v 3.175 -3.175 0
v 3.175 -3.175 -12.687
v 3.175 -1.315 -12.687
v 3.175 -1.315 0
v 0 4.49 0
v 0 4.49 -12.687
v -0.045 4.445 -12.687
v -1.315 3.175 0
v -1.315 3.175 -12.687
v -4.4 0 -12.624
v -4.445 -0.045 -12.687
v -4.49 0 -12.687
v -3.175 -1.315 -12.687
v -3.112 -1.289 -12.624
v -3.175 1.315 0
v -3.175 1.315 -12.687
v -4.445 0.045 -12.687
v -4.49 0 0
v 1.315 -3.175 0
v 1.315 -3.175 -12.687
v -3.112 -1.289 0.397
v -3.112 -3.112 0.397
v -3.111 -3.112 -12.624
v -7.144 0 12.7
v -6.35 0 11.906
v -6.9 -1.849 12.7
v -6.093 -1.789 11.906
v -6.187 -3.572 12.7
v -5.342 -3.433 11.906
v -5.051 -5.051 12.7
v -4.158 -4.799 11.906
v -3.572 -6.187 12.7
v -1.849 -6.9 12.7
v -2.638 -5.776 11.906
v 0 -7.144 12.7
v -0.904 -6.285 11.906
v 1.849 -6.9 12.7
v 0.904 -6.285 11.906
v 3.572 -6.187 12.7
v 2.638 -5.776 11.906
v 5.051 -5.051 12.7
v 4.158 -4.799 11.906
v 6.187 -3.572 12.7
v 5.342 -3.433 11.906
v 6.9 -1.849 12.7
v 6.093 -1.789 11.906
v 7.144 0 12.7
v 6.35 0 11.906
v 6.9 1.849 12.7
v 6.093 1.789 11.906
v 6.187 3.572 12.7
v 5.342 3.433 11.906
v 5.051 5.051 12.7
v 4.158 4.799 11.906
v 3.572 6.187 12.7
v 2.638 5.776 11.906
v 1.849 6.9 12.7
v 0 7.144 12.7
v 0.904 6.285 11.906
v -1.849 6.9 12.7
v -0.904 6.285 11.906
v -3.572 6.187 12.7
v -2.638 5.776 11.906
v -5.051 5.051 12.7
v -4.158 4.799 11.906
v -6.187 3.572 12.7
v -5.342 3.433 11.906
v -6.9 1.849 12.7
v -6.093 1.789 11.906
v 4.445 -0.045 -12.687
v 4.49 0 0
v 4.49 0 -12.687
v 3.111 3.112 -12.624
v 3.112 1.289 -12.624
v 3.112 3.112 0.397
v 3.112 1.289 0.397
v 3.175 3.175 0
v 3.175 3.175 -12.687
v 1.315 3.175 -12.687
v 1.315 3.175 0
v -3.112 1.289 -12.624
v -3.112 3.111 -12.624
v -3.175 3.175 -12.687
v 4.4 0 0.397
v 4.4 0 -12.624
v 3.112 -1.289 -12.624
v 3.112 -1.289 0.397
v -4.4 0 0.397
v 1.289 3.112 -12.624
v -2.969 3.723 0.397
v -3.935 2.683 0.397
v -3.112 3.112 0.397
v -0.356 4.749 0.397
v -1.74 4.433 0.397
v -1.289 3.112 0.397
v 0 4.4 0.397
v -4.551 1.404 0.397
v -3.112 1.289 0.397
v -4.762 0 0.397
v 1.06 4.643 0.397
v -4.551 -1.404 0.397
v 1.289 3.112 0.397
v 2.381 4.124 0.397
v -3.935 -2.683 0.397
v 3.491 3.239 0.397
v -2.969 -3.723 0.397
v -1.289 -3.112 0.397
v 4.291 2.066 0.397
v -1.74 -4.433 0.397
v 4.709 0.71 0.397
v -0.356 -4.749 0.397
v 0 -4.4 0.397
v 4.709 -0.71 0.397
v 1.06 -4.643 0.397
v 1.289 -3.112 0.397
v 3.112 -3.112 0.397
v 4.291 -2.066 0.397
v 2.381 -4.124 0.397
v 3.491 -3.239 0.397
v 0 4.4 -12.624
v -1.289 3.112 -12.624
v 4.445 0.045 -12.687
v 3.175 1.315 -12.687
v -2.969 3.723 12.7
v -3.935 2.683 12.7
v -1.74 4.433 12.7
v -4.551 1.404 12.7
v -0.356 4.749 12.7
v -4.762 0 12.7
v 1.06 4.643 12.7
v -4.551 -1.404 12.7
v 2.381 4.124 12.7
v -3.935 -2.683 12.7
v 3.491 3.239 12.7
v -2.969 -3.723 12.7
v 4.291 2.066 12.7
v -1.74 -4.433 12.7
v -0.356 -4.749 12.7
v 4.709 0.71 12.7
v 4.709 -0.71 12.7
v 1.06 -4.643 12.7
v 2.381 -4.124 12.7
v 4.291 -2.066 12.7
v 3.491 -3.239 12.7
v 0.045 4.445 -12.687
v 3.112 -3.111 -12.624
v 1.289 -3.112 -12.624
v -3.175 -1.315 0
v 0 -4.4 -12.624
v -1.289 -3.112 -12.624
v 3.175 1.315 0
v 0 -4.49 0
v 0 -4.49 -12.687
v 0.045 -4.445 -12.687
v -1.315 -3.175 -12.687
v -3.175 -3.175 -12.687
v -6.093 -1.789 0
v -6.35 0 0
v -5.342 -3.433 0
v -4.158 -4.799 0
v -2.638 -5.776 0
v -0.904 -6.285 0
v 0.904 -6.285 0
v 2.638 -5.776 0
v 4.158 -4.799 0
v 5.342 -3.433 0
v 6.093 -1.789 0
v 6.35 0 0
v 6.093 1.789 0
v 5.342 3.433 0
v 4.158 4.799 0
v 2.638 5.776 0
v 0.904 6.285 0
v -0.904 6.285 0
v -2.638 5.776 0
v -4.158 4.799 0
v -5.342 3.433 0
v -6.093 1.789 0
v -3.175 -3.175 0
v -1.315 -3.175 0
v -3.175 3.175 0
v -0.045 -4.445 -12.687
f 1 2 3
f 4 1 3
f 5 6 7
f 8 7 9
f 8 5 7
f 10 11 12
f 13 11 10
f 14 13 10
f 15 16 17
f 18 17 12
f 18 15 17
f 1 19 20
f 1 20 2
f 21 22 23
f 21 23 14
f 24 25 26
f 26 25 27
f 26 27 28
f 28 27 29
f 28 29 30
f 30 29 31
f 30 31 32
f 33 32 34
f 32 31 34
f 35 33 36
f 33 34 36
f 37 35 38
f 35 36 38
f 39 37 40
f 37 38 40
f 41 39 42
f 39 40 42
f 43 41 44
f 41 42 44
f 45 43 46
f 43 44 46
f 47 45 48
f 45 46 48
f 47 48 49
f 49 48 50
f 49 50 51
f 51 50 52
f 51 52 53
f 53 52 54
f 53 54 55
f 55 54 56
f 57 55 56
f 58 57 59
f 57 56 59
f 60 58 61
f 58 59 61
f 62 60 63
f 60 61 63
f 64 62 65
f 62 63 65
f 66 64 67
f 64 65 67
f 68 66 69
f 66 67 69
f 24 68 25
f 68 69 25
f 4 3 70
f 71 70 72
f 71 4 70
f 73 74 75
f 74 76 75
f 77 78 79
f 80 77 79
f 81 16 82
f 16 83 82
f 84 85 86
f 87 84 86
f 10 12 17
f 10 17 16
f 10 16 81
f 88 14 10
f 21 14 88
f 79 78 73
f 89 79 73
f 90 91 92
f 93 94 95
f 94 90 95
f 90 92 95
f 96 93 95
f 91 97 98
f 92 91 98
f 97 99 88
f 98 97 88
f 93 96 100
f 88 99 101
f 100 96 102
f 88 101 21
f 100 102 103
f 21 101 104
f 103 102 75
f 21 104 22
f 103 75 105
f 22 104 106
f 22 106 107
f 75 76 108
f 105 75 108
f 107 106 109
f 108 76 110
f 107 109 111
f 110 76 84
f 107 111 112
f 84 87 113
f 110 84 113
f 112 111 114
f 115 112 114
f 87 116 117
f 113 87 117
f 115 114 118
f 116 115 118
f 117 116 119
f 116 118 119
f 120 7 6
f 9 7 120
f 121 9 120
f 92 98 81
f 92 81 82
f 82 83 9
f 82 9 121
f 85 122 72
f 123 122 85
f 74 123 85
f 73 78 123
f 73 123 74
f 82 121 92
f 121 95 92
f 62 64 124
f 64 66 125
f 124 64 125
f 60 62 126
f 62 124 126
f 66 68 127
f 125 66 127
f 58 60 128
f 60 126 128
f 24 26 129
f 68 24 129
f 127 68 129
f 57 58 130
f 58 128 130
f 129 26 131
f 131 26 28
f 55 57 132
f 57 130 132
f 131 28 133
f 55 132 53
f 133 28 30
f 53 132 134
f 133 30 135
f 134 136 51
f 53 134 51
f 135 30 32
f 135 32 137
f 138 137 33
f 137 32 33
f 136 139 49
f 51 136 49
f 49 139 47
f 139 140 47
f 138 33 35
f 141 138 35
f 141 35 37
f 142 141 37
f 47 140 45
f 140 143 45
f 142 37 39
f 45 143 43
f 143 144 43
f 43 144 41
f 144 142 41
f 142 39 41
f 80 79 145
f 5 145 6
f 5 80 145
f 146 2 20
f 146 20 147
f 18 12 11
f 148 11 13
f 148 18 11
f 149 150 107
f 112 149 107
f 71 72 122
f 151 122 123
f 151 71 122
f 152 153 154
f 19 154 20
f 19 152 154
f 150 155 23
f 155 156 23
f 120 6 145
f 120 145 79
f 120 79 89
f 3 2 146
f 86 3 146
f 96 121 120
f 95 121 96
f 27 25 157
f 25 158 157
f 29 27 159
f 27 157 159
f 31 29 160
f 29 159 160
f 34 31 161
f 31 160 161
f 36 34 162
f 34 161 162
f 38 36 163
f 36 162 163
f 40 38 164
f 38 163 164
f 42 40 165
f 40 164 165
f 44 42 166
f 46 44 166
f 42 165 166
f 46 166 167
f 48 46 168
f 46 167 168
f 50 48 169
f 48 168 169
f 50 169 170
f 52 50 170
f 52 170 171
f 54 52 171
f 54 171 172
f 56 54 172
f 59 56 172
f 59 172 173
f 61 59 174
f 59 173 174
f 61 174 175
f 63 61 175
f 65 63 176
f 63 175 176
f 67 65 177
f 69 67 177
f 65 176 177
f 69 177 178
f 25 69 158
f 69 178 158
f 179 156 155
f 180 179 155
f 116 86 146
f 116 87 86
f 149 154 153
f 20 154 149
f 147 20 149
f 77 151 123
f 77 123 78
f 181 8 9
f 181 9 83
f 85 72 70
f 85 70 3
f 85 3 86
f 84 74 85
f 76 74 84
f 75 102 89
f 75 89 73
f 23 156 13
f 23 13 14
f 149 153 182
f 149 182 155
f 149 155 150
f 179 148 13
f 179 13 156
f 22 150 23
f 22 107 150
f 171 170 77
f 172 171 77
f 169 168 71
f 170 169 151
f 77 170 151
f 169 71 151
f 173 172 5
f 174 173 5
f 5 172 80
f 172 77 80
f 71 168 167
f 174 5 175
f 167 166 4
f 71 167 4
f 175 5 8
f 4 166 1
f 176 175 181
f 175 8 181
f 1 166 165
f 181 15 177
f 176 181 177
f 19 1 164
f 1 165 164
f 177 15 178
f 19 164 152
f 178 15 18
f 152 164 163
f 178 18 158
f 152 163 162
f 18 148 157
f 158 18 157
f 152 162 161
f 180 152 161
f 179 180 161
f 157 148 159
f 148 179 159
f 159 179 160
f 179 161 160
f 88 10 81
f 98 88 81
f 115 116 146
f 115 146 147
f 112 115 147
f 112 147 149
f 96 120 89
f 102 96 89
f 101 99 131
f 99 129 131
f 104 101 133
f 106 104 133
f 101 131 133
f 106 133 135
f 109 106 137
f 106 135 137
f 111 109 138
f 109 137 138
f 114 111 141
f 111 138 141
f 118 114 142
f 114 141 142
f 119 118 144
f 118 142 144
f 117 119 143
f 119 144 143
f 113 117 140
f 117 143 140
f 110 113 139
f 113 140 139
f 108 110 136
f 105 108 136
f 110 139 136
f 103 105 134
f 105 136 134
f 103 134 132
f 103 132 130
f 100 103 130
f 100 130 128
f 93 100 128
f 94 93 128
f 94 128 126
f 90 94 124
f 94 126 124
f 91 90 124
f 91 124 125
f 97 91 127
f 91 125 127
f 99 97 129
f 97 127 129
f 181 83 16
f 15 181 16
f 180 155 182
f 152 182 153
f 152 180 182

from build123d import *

# Parameters (mm, degrees)
F1_DEPTH      = 12.7
F4_DEPTH      = 25.4
F5_T1_DEPTH   = 2.0186367444
F5_T3_DEPTH   = 2.0186367444
F5_T5_DEPTH   = 2.0186367444
F5_T7_DEPTH   = 2.0186367444
F5_T9_DEPTH   = 2.0186367444
F5_T11_DEPTH  = 2.0186367444
F5_T13_DEPTH  = 2.0186367444
F5_T15_DEPTH  = 2.0186367444
F5_T17_DEPTH  = 2.0186367444
F5_T19_DEPTH  = 2.0186367444
F5_T21_DEPTH  = 2.0186367444
F5_T23_DEPTH  = 2.0186367444
F5_T29_DEPTH  = 2.214598988
F5_T35_DEPTH  = 2.214598988
F5_T44_DEPTH  = 2.214598988
F5_T50_DEPTH  = 2.214598988
F5_T59_DEPTH  = 2.214598988
F5_T65_DEPTH  = 2.214598988
F5_T74_DEPTH  = 2.214598988
F5_T80_DEPTH  = 2.214598988
F5_T89_DEPTH  = 2.214598988
F5_T95_DEPTH  = 2.214598988
F5_T104_DEPTH = 2.214598988
F5_T110_DEPTH = 2.214598988
F5_T119_DEPTH = 2.214598988
F5_T125_DEPTH = 2.214598988
F5_T134_DEPTH = 2.214598988
F5_T140_DEPTH = 2.214598988


# Not quite as in the source:
# - a fillet or chamfer that OpenCascade refuses, or shapes differently, is made with other operations: its cross-section is extruded or revolved along the edge and cut away or added


with BuildPart() as f1:
    # F0 (on Top) → F1 (new body)
    with BuildSketch(Plane.XY):
        Polygon((1.3151280605, -3.175), (3.175, -3.175), (3.175, -1.3151280605), (4.4901280605, 0), (3.175, 1.3151280605), (3.175, 3.175), (1.3151280605, 3.175), (0, 4.4901280605), (-1.3151280605, 3.175), (-3.175, 3.175), (-3.175, 1.3151280605), (-4.4901280605, 0), (-3.175, -1.3151280605), (-3.175, -3.175), (-1.3151280605, -3.175), (0, -4.4901280605), align=None)
        Polygon((3.1115, -1.2888254993), (3.1115, -3.1115), (1.2888254993, -3.1115), (0, -4.4003254993), (-1.2888254993, -3.1115), (-3.1115, -3.1115), (-3.1115, -1.2888254993), (-4.4003254993, 0), (-3.1115, 1.2888254993), (-3.1115, 3.1115), (-1.2888254993, 3.1115), (0, 4.4003254993), (1.2888254993, 3.1115), (3.1115, 3.1115), (3.1115, 1.2888254993), (4.4003254993, 0), align=None, mode=Mode.SUBTRACT)
    extrude(amount=-F1_DEPTH)

    # F2 (on Front) → F3 (revolve)
    with BuildSketch(Plane.XZ):
        Polygon((-6.35, 0), (0, 0), (0, 0.396875), (-4.7625, 0.396875), (-4.7625, 12.7), (-6.35, 12.7), (-6.35, 11.90625), align=None)
        Polygon((-7.14375, 12.7), (-6.35, 11.90625), (-6.35, 12.7), align=None)
    revolve(axis=Axis((0, 0, 0.1984375), (0, 0, 1)))

    # F4 (cut): a face of the model
    f4_faces = [f1.faces().sort_by_distance(p)[0] for p in [
        (0, 0, 0),
    ]]
    extrude(f4_faces, amount=-F4_DEPTH, mode=Mode.SUBTRACT)

    # F5: chamfer of 0.0762 on 16 edges, made by hand

    # F5_s2 → F5_t1 (cut)
    with BuildSketch(Plane(origin=(-0.772771019, -0.772771019, 0), x_dir=(0, 0, 1), z_dir=(-0.7071067812, -0.7071067812, 0))):
        Polygon((-12.7, -3.1877), (-12.6238, -3.1115), (-12.7, -3.1115), align=None)
    extrude(amount=F5_T1_DEPTH, mode=Mode.SUBTRACT)

    # F5_s4 → F5_t3 (cut)
    with BuildSketch(Plane.YZ.offset(1.0928632556)):
        Polygon((-3.1877, -12.7), (-3.1115, -12.6238), (-3.1115, -12.7), align=None)
        Polygon((3.1877, -12.7), (3.1115, -12.6238), (3.1115, -12.7), align=None)
    extrude(amount=F5_T3_DEPTH, mode=Mode.SUBTRACT)

    # F5_s6 → F5_t5 (cut)
    with BuildSketch(Plane.XZ.offset(1.0928632556)):
        Polygon((3.1877, -12.7), (3.1115, -12.6238), (3.1115, -12.7), align=None)
        Polygon((-3.1877, -12.7), (-3.1115, -12.6238), (-3.1115, -12.7), align=None)
    extrude(amount=F5_T5_DEPTH, mode=Mode.SUBTRACT)

    # F5_s8 → F5_t7 (cut)
    with BuildSketch(Plane(origin=(2.2001627497, 2.2001627497, 0), x_dir=(0, 0, 1), z_dir=(-0.7071067812, -0.7071067812, 0))):
        Polygon((-12.7, -3.1877), (-12.6238, -3.1115), (-12.7, -3.1115), align=None)
    extrude(amount=F5_T7_DEPTH, mode=Mode.SUBTRACT)

    # F5_s10 → F5_t9 (cut)
    with BuildSketch(Plane(origin=(0.772771019, -0.772771019, 0), x_dir=(0, 0, 1), z_dir=(0.7071067812, -0.7071067812, 0))):
        Polygon((-12.7, -3.1877), (-12.6238, -3.1115), (-12.7, -3.1115), align=None)
    extrude(amount=F5_T9_DEPTH, mode=Mode.SUBTRACT)

    # F5_s12 → F5_t11 (cut)
    with BuildSketch(Plane.XZ.offset(-3.1115)):
        Polygon((3.1877, -12.7), (3.1115, -12.6238), (3.1115, -12.7), align=None)
        Polygon((-3.1877, -12.7), (-3.1115, -12.6238), (-3.1115, -12.7), align=None)
    extrude(amount=F5_T11_DEPTH, mode=Mode.SUBTRACT)

    # F5_s14 → F5_t13 (cut)
    with BuildSketch(Plane(origin=(-2.2001627497, 2.2001627497, 0), x_dir=(0, 0, 1), z_dir=(0.7071067812, -0.7071067812, 0))):
        Polygon((-12.7, -3.1877), (-12.6238, -3.1115), (-12.7, -3.1115), align=None)
    extrude(amount=F5_T13_DEPTH, mode=Mode.SUBTRACT)

    # F5_s16 → F5_t15 (cut)
    with BuildSketch(Plane(origin=(0.772771019, 0.772771019, 0), x_dir=(0, 0, 1), z_dir=(0.7071067812, 0.7071067812, 0))):
        Polygon((-12.7, -3.1877), (-12.6238, -3.1115), (-12.7, -3.1115), align=None)
    extrude(amount=F5_T15_DEPTH, mode=Mode.SUBTRACT)

    # F5_s18 → F5_t17 (cut)
    with BuildSketch(Plane.YZ.offset(-3.1115)):
        Polygon((3.1877, -12.7), (3.1115, -12.6238), (3.1115, -12.7), align=None)
        Polygon((-3.1877, -12.7), (-3.1115, -12.6238), (-3.1115, -12.7), align=None)
    extrude(amount=F5_T17_DEPTH, mode=Mode.SUBTRACT)

    # F5_s20 → F5_t19 (cut)
    with BuildSketch(Plane(origin=(-2.2001627497, -2.2001627497, 0), x_dir=(0, 0, 1), z_dir=(0.7071067812, 0.7071067812, 0))):
        Polygon((-12.7, -3.1877), (-12.6238, -3.1115), (-12.7, -3.1115), align=None)
    extrude(amount=F5_T19_DEPTH, mode=Mode.SUBTRACT)

    # F5_s22 → F5_t21 (cut)
    with BuildSketch(Plane(origin=(-0.772771019, 0.772771019, 0), x_dir=(0, 0, 1), z_dir=(-0.7071067812, 0.7071067812, 0))):
        Polygon((-12.7, -3.1877), (-12.6238, -3.1115), (-12.7, -3.1115), align=None)
    extrude(amount=F5_T21_DEPTH, mode=Mode.SUBTRACT)

    # F5_s24 → F5_t23 (cut)
    with BuildSketch(Plane(origin=(2.2001627497, -2.2001627497, 0), x_dir=(0, 0, 1), z_dir=(-0.7071067812, 0.7071067812, 0))):
        Polygon((-12.7, -3.1877), (-12.6238, -3.1115), (-12.7, -3.1115), align=None)
    extrude(amount=F5_T23_DEPTH, mode=Mode.SUBTRACT)


with BuildPart() as f5_tool27:
    # F5_s28 → F5_t29 (new body)
    with BuildSketch(Plane(origin=(-0.772771019, -0.772771019, 0), x_dir=(0, 0, 1), z_dir=(-0.7071067812, -0.7071067812, 0))):
        Polygon((-12.7, -3.1877), (-12.6238, -3.1115), (-12.7, -3.1115), align=None)
    extrude(amount=F5_T29_DEPTH)

    split(bisect_by=Plane(origin=(2.2450640303, -2.2450640303, 0), x_dir=(0, 0, 1), z_dir=(-0.7071067812, 0.7071067812, 0)), keep=Keep.TOP)

    split(bisect_by=Plane(origin=(-2.2001627497, -2.2001627497, 0), x_dir=(0, 0, 1), z_dir=(-0.7071067812, -0.7071067812, 0)), keep=Keep.TOP)

    split(bisect_by=Plane(origin=(-2.2450640303, -2.2450640303, 0), x_dir=(0, 0, 1), z_dir=(0.7071067812, 0.7071067812, 0)), keep=Keep.TOP)


with BuildPart() as f5_tool33:
    # F5_s34 → F5_t35 (new body)
    with BuildSketch(Plane(origin=(2.338728981, -2.338728981, 0), x_dir=(0, 0, 1), z_dir=(-0.7071067812, 0.7071067812, 0))):
        Polygon((-12.7, -3.1877), (-12.6238, -3.1115), (-12.7, -3.1115), align=None)
    extrude(amount=F5_T35_DEPTH)

    split(bisect_by=Plane(origin=(2.2450640303, -2.2450640303, 0), x_dir=(0, 0, 1), z_dir=(-0.7071067812, 0.7071067812, 0)), keep=Keep.TOP)

    split(bisect_by=Plane(origin=(2.2001627497, -2.2001627497, 0), x_dir=(0, 0, 1), z_dir=(0.7071067812, -0.7071067812, 0)), keep=Keep.TOP)

    split(bisect_by=Plane(origin=(-2.2450640303, -2.2450640303, 0), x_dir=(0, 0, 1), z_dir=(0.7071067812, 0.7071067812, 0)), keep=Keep.TOP)


with BuildPart() as f5_tool27_1:
    add(f5_tool27.part)

    # F5_t39: intersect F5_tool33
    add(f5_tool33.part, mode=Mode.INTERSECT)


with BuildPart() as f1_1:
    add(f1.part)

    # F5_t25: cut F5_tool27
    add(f5_tool27_1.part, mode=Mode.SUBTRACT)


with BuildPart() as f5_tool42:
    # F5_s43 → F5_t44 (new body)
    with BuildSketch(Plane.XZ.offset(1.0928632556)):
        Polygon((3.1877, -12.7), (3.1115, -12.6238), (3.1115, -12.7), align=None)
    extrude(amount=F5_T44_DEPTH)

    split(bisect_by=Plane.XZ.offset(3.1115), keep=Keep.TOP)

    split(bisect_by=Plane.YZ.offset(3.175), keep=Keep.BOTTOM)

    split(bisect_by=Plane.XZ.offset(3.175), keep=Keep.BOTTOM)


with BuildPart() as f5_tool48:
    # F5_s49 → F5_t50 (new body)
    with BuildSketch(Plane.YZ.offset(3.3074622437)):
        Polygon((-3.1877, -12.7), (-3.1115, -12.6238), (-3.1115, -12.7), align=None)
    extrude(amount=-F5_T50_DEPTH)

    split(bisect_by=Plane.YZ.offset(3.1115), keep=Keep.TOP)

    split(bisect_by=Plane.YZ.offset(3.175), keep=Keep.BOTTOM)

    split(bisect_by=Plane.XZ.offset(3.175), keep=Keep.BOTTOM)


with BuildPart() as f5_tool42_1:
    add(f5_tool42.part)

    # F5_t54: intersect F5_tool48
    add(f5_tool48.part, mode=Mode.INTERSECT)


with BuildPart() as f1_2:
    add(f1_1.part)

    # F5_t40: cut F5_tool42
    add(f5_tool42_1.part, mode=Mode.SUBTRACT)


with BuildPart() as f5_tool57:
    # F5_s58 → F5_t59 (new body)
    with BuildSketch(Plane(origin=(0.772771019, -0.772771019, 0), x_dir=(0, 0, 1), z_dir=(0.7071067812, -0.7071067812, 0))):
        Polygon((-12.7, -3.1877), (-12.6238, -3.1115), (-12.7, -3.1115), align=None)
    extrude(amount=F5_T59_DEPTH)

    split(bisect_by=Plane(origin=(2.2001627497, -2.2001627497, 0), x_dir=(0, 0, 1), z_dir=(0.7071067812, -0.7071067812, 0)), keep=Keep.TOP)

    split(bisect_by=Plane(origin=(2.2450640303, 2.2450640303, 0), x_dir=(0, 0, 1), z_dir=(-0.7071067812, -0.7071067812, 0)), keep=Keep.TOP)

    split(bisect_by=Plane(origin=(2.2450640303, -2.2450640303, 0), x_dir=(0, 0, 1), z_dir=(-0.7071067812, 0.7071067812, 0)), keep=Keep.TOP)


with BuildPart() as f5_tool63:
    # F5_s64 → F5_t65 (new body)
    with BuildSketch(Plane(origin=(2.338728981, 2.338728981, 0), x_dir=(0, 0, 1), z_dir=(-0.7071067812, -0.7071067812, 0))):
        Polygon((-12.7, -3.1877), (-12.6238, -3.1115), (-12.7, -3.1115), align=None)
    extrude(amount=F5_T65_DEPTH)

    split(bisect_by=Plane(origin=(2.2001627497, 2.2001627497, 0), x_dir=(0, 0, 1), z_dir=(0.7071067812, 0.7071067812, 0)), keep=Keep.TOP)

    split(bisect_by=Plane(origin=(2.2450640303, 2.2450640303, 0), x_dir=(0, 0, 1), z_dir=(-0.7071067812, -0.7071067812, 0)), keep=Keep.TOP)

    split(bisect_by=Plane(origin=(2.2450640303, -2.2450640303, 0), x_dir=(0, 0, 1), z_dir=(-0.7071067812, 0.7071067812, 0)), keep=Keep.TOP)


with BuildPart() as f5_tool57_1:
    add(f5_tool57.part)

    # F5_t69: intersect F5_tool63
    add(f5_tool63.part, mode=Mode.INTERSECT)


with BuildPart() as f1_3:
    add(f1_2.part)

    # F5_t55: cut F5_tool57
    add(f5_tool57_1.part, mode=Mode.SUBTRACT)


with BuildPart() as f5_tool72:
    # F5_s73 → F5_t74 (new body)
    with BuildSketch(Plane.YZ.offset(1.0928632556)):
        Polygon((3.1877, -12.7), (3.1115, -12.6238), (3.1115, -12.7), align=None)
    extrude(amount=F5_T74_DEPTH)

    split(bisect_by=Plane.YZ.offset(3.1115), keep=Keep.TOP)

    split(bisect_by=Plane.XZ.offset(-3.175), keep=Keep.TOP)

    split(bisect_by=Plane.YZ.offset(3.175), keep=Keep.BOTTOM)


with BuildPart() as f5_tool78:
    # F5_s79 → F5_t80 (new body)
    with BuildSketch(Plane.XZ.offset(-3.3074622437)):
        Polygon((3.1877, -12.7), (3.1115, -12.6238), (3.1115, -12.7), align=None)
    extrude(amount=F5_T80_DEPTH)

    split(bisect_by=Plane.XZ.offset(-3.1115), keep=Keep.BOTTOM)

    split(bisect_by=Plane.XZ.offset(-3.175), keep=Keep.TOP)

    split(bisect_by=Plane.YZ.offset(3.175), keep=Keep.BOTTOM)


with BuildPart() as f5_tool72_1:
    add(f5_tool72.part)

    # F5_t84: intersect F5_tool78
    add(f5_tool78.part, mode=Mode.INTERSECT)


with BuildPart() as f1_4:
    add(f1_3.part)

    # F5_t70: cut F5_tool72
    add(f5_tool72_1.part, mode=Mode.SUBTRACT)


with BuildPart() as f5_tool87:
    # F5_s88 → F5_t89 (new body)
    with BuildSketch(Plane(origin=(-2.338728981, 2.338728981, 0), x_dir=(0, 0, 1), z_dir=(0.7071067812, -0.7071067812, 0))):
        Polygon((-12.7, -3.1877), (-12.6238, -3.1115), (-12.7, -3.1115), align=None)
    extrude(amount=F5_T89_DEPTH)

    split(bisect_by=Plane(origin=(-2.2001627497, 2.2001627497, 0), x_dir=(0, 0, 1), z_dir=(-0.7071067812, 0.7071067812, 0)), keep=Keep.TOP)

    split(bisect_by=Plane(origin=(-2.2450640303, 2.2450640303, 0), x_dir=(0, 0, 1), z_dir=(0.7071067812, -0.7071067812, 0)), keep=Keep.TOP)

    split(bisect_by=Plane(origin=(2.2450640303, 2.2450640303, 0), x_dir=(0, 0, 1), z_dir=(-0.7071067812, -0.7071067812, 0)), keep=Keep.TOP)


with BuildPart() as f5_tool93:
    # F5_s94 → F5_t95 (new body)
    with BuildSketch(Plane(origin=(0.772771019, 0.772771019, 0), x_dir=(0, 0, 1), z_dir=(0.7071067812, 0.7071067812, 0))):
        Polygon((-12.7, -3.1877), (-12.6238, -3.1115), (-12.7, -3.1115), align=None)
    extrude(amount=F5_T95_DEPTH)

    split(bisect_by=Plane(origin=(2.2001627497, 2.2001627497, 0), x_dir=(0, 0, 1), z_dir=(0.7071067812, 0.7071067812, 0)), keep=Keep.TOP)

    split(bisect_by=Plane(origin=(-2.2450640303, 2.2450640303, 0), x_dir=(0, 0, 1), z_dir=(0.7071067812, -0.7071067812, 0)), keep=Keep.TOP)

    split(bisect_by=Plane(origin=(2.2450640303, 2.2450640303, 0), x_dir=(0, 0, 1), z_dir=(-0.7071067812, -0.7071067812, 0)), keep=Keep.TOP)


with BuildPart() as f5_tool87_1:
    add(f5_tool87.part)

    # F5_t99: intersect F5_tool93
    add(f5_tool93.part, mode=Mode.INTERSECT)


with BuildPart() as f1_5:
    add(f1_4.part)

    # F5_t85: cut F5_tool87
    add(f5_tool87_1.part, mode=Mode.SUBTRACT)


with BuildPart() as f5_tool102:
    # F5_s103 → F5_t104 (new body)
    with BuildSketch(Plane.XZ.offset(-1.0928632556)):
        Polygon((-3.1877, -12.7), (-3.1115, -12.6238), (-3.1115, -12.7), align=None)
    extrude(amount=-F5_T104_DEPTH)

    split(bisect_by=Plane.XZ.offset(-3.1115), keep=Keep.BOTTOM)

    split(bisect_by=Plane.YZ.offset(-3.175), keep=Keep.TOP)

    split(bisect_by=Plane.XZ.offset(-3.175), keep=Keep.TOP)


with BuildPart() as f5_tool108:
    # F5_s109 → F5_t110 (new body)
    with BuildSketch(Plane.YZ.offset(-3.3074622437)):
        Polygon((3.1877, -12.7), (3.1115, -12.6238), (3.1115, -12.7), align=None)
    extrude(amount=F5_T110_DEPTH)

    split(bisect_by=Plane.YZ.offset(-3.1115), keep=Keep.BOTTOM)

    split(bisect_by=Plane.YZ.offset(-3.175), keep=Keep.TOP)

    split(bisect_by=Plane.XZ.offset(-3.175), keep=Keep.TOP)


with BuildPart() as f5_tool102_1:
    add(f5_tool102.part)

    # F5_t114: intersect F5_tool108
    add(f5_tool108.part, mode=Mode.INTERSECT)


with BuildPart() as f1_6:
    add(f1_5.part)

    # F5_t100: cut F5_tool102
    add(f5_tool102_1.part, mode=Mode.SUBTRACT)


with BuildPart() as f5_tool117:
    # F5_s118 → F5_t119 (new body)
    with BuildSketch(Plane(origin=(-0.772771019, 0.772771019, 0), x_dir=(0, 0, 1), z_dir=(-0.7071067812, 0.7071067812, 0))):
        Polygon((-12.7, -3.1877), (-12.6238, -3.1115), (-12.7, -3.1115), align=None)
    extrude(amount=F5_T119_DEPTH)

    split(bisect_by=Plane(origin=(-2.2001627497, 2.2001627497, 0), x_dir=(0, 0, 1), z_dir=(-0.7071067812, 0.7071067812, 0)), keep=Keep.TOP)

    split(bisect_by=Plane(origin=(-2.2450640303, -2.2450640303, 0), x_dir=(0, 0, 1), z_dir=(0.7071067812, 0.7071067812, 0)), keep=Keep.TOP)

    split(bisect_by=Plane(origin=(-2.2450640303, 2.2450640303, 0), x_dir=(0, 0, 1), z_dir=(0.7071067812, -0.7071067812, 0)), keep=Keep.TOP)


with BuildPart() as f5_tool123:
    # F5_s124 → F5_t125 (new body)
    with BuildSketch(Plane(origin=(-2.338728981, -2.338728981, 0), x_dir=(0, 0, 1), z_dir=(0.7071067812, 0.7071067812, 0))):
        Polygon((-12.7, -3.1877), (-12.6238, -3.1115), (-12.7, -3.1115), align=None)
    extrude(amount=F5_T125_DEPTH)

    split(bisect_by=Plane(origin=(-2.2001627497, -2.2001627497, 0), x_dir=(0, 0, 1), z_dir=(-0.7071067812, -0.7071067812, 0)), keep=Keep.TOP)

    split(bisect_by=Plane(origin=(-2.2450640303, -2.2450640303, 0), x_dir=(0, 0, 1), z_dir=(0.7071067812, 0.7071067812, 0)), keep=Keep.TOP)

    split(bisect_by=Plane(origin=(-2.2450640303, 2.2450640303, 0), x_dir=(0, 0, 1), z_dir=(0.7071067812, -0.7071067812, 0)), keep=Keep.TOP)


with BuildPart() as f5_tool117_1:
    add(f5_tool117.part)

    # F5_t129: intersect F5_tool123
    add(f5_tool123.part, mode=Mode.INTERSECT)


with BuildPart() as f1_7:
    add(f1_6.part)

    # F5_t115: cut F5_tool117
    add(f5_tool117_1.part, mode=Mode.SUBTRACT)


with BuildPart() as f5_tool132:
    # F5_s133 → F5_t134 (new body)
    with BuildSketch(Plane.YZ.offset(-1.0928632556)):
        Polygon((-3.1877, -12.7), (-3.1115, -12.6238), (-3.1115, -12.7), align=None)
    extrude(amount=-F5_T134_DEPTH)

    split(bisect_by=Plane.YZ.offset(-3.1115), keep=Keep.BOTTOM)

    split(bisect_by=Plane.XZ.offset(3.175), keep=Keep.BOTTOM)

    split(bisect_by=Plane.YZ.offset(-3.175), keep=Keep.TOP)


with BuildPart() as f5_tool138:
    # F5_s139 → F5_t140 (new body)
    with BuildSketch(Plane.XZ.offset(3.3074622437)):
        Polygon((-3.1877, -12.7), (-3.1115, -12.6238), (-3.1115, -12.7), align=None)
    extrude(amount=-F5_T140_DEPTH)

    split(bisect_by=Plane.XZ.offset(3.1115), keep=Keep.TOP)

    split(bisect_by=Plane.XZ.offset(3.175), keep=Keep.BOTTOM)

    split(bisect_by=Plane.YZ.offset(-3.175), keep=Keep.TOP)


with BuildPart() as f5_tool132_1:
    add(f5_tool132.part)

    # F5_t144: intersect F5_tool138
    add(f5_tool138.part, mode=Mode.INTERSECT)


with BuildPart() as f1_8:
    add(f1_7.part)

    # F5_t130: cut F5_tool132
    add(f5_tool132_1.part, mode=Mode.SUBTRACT)


solid = f1_8.part
